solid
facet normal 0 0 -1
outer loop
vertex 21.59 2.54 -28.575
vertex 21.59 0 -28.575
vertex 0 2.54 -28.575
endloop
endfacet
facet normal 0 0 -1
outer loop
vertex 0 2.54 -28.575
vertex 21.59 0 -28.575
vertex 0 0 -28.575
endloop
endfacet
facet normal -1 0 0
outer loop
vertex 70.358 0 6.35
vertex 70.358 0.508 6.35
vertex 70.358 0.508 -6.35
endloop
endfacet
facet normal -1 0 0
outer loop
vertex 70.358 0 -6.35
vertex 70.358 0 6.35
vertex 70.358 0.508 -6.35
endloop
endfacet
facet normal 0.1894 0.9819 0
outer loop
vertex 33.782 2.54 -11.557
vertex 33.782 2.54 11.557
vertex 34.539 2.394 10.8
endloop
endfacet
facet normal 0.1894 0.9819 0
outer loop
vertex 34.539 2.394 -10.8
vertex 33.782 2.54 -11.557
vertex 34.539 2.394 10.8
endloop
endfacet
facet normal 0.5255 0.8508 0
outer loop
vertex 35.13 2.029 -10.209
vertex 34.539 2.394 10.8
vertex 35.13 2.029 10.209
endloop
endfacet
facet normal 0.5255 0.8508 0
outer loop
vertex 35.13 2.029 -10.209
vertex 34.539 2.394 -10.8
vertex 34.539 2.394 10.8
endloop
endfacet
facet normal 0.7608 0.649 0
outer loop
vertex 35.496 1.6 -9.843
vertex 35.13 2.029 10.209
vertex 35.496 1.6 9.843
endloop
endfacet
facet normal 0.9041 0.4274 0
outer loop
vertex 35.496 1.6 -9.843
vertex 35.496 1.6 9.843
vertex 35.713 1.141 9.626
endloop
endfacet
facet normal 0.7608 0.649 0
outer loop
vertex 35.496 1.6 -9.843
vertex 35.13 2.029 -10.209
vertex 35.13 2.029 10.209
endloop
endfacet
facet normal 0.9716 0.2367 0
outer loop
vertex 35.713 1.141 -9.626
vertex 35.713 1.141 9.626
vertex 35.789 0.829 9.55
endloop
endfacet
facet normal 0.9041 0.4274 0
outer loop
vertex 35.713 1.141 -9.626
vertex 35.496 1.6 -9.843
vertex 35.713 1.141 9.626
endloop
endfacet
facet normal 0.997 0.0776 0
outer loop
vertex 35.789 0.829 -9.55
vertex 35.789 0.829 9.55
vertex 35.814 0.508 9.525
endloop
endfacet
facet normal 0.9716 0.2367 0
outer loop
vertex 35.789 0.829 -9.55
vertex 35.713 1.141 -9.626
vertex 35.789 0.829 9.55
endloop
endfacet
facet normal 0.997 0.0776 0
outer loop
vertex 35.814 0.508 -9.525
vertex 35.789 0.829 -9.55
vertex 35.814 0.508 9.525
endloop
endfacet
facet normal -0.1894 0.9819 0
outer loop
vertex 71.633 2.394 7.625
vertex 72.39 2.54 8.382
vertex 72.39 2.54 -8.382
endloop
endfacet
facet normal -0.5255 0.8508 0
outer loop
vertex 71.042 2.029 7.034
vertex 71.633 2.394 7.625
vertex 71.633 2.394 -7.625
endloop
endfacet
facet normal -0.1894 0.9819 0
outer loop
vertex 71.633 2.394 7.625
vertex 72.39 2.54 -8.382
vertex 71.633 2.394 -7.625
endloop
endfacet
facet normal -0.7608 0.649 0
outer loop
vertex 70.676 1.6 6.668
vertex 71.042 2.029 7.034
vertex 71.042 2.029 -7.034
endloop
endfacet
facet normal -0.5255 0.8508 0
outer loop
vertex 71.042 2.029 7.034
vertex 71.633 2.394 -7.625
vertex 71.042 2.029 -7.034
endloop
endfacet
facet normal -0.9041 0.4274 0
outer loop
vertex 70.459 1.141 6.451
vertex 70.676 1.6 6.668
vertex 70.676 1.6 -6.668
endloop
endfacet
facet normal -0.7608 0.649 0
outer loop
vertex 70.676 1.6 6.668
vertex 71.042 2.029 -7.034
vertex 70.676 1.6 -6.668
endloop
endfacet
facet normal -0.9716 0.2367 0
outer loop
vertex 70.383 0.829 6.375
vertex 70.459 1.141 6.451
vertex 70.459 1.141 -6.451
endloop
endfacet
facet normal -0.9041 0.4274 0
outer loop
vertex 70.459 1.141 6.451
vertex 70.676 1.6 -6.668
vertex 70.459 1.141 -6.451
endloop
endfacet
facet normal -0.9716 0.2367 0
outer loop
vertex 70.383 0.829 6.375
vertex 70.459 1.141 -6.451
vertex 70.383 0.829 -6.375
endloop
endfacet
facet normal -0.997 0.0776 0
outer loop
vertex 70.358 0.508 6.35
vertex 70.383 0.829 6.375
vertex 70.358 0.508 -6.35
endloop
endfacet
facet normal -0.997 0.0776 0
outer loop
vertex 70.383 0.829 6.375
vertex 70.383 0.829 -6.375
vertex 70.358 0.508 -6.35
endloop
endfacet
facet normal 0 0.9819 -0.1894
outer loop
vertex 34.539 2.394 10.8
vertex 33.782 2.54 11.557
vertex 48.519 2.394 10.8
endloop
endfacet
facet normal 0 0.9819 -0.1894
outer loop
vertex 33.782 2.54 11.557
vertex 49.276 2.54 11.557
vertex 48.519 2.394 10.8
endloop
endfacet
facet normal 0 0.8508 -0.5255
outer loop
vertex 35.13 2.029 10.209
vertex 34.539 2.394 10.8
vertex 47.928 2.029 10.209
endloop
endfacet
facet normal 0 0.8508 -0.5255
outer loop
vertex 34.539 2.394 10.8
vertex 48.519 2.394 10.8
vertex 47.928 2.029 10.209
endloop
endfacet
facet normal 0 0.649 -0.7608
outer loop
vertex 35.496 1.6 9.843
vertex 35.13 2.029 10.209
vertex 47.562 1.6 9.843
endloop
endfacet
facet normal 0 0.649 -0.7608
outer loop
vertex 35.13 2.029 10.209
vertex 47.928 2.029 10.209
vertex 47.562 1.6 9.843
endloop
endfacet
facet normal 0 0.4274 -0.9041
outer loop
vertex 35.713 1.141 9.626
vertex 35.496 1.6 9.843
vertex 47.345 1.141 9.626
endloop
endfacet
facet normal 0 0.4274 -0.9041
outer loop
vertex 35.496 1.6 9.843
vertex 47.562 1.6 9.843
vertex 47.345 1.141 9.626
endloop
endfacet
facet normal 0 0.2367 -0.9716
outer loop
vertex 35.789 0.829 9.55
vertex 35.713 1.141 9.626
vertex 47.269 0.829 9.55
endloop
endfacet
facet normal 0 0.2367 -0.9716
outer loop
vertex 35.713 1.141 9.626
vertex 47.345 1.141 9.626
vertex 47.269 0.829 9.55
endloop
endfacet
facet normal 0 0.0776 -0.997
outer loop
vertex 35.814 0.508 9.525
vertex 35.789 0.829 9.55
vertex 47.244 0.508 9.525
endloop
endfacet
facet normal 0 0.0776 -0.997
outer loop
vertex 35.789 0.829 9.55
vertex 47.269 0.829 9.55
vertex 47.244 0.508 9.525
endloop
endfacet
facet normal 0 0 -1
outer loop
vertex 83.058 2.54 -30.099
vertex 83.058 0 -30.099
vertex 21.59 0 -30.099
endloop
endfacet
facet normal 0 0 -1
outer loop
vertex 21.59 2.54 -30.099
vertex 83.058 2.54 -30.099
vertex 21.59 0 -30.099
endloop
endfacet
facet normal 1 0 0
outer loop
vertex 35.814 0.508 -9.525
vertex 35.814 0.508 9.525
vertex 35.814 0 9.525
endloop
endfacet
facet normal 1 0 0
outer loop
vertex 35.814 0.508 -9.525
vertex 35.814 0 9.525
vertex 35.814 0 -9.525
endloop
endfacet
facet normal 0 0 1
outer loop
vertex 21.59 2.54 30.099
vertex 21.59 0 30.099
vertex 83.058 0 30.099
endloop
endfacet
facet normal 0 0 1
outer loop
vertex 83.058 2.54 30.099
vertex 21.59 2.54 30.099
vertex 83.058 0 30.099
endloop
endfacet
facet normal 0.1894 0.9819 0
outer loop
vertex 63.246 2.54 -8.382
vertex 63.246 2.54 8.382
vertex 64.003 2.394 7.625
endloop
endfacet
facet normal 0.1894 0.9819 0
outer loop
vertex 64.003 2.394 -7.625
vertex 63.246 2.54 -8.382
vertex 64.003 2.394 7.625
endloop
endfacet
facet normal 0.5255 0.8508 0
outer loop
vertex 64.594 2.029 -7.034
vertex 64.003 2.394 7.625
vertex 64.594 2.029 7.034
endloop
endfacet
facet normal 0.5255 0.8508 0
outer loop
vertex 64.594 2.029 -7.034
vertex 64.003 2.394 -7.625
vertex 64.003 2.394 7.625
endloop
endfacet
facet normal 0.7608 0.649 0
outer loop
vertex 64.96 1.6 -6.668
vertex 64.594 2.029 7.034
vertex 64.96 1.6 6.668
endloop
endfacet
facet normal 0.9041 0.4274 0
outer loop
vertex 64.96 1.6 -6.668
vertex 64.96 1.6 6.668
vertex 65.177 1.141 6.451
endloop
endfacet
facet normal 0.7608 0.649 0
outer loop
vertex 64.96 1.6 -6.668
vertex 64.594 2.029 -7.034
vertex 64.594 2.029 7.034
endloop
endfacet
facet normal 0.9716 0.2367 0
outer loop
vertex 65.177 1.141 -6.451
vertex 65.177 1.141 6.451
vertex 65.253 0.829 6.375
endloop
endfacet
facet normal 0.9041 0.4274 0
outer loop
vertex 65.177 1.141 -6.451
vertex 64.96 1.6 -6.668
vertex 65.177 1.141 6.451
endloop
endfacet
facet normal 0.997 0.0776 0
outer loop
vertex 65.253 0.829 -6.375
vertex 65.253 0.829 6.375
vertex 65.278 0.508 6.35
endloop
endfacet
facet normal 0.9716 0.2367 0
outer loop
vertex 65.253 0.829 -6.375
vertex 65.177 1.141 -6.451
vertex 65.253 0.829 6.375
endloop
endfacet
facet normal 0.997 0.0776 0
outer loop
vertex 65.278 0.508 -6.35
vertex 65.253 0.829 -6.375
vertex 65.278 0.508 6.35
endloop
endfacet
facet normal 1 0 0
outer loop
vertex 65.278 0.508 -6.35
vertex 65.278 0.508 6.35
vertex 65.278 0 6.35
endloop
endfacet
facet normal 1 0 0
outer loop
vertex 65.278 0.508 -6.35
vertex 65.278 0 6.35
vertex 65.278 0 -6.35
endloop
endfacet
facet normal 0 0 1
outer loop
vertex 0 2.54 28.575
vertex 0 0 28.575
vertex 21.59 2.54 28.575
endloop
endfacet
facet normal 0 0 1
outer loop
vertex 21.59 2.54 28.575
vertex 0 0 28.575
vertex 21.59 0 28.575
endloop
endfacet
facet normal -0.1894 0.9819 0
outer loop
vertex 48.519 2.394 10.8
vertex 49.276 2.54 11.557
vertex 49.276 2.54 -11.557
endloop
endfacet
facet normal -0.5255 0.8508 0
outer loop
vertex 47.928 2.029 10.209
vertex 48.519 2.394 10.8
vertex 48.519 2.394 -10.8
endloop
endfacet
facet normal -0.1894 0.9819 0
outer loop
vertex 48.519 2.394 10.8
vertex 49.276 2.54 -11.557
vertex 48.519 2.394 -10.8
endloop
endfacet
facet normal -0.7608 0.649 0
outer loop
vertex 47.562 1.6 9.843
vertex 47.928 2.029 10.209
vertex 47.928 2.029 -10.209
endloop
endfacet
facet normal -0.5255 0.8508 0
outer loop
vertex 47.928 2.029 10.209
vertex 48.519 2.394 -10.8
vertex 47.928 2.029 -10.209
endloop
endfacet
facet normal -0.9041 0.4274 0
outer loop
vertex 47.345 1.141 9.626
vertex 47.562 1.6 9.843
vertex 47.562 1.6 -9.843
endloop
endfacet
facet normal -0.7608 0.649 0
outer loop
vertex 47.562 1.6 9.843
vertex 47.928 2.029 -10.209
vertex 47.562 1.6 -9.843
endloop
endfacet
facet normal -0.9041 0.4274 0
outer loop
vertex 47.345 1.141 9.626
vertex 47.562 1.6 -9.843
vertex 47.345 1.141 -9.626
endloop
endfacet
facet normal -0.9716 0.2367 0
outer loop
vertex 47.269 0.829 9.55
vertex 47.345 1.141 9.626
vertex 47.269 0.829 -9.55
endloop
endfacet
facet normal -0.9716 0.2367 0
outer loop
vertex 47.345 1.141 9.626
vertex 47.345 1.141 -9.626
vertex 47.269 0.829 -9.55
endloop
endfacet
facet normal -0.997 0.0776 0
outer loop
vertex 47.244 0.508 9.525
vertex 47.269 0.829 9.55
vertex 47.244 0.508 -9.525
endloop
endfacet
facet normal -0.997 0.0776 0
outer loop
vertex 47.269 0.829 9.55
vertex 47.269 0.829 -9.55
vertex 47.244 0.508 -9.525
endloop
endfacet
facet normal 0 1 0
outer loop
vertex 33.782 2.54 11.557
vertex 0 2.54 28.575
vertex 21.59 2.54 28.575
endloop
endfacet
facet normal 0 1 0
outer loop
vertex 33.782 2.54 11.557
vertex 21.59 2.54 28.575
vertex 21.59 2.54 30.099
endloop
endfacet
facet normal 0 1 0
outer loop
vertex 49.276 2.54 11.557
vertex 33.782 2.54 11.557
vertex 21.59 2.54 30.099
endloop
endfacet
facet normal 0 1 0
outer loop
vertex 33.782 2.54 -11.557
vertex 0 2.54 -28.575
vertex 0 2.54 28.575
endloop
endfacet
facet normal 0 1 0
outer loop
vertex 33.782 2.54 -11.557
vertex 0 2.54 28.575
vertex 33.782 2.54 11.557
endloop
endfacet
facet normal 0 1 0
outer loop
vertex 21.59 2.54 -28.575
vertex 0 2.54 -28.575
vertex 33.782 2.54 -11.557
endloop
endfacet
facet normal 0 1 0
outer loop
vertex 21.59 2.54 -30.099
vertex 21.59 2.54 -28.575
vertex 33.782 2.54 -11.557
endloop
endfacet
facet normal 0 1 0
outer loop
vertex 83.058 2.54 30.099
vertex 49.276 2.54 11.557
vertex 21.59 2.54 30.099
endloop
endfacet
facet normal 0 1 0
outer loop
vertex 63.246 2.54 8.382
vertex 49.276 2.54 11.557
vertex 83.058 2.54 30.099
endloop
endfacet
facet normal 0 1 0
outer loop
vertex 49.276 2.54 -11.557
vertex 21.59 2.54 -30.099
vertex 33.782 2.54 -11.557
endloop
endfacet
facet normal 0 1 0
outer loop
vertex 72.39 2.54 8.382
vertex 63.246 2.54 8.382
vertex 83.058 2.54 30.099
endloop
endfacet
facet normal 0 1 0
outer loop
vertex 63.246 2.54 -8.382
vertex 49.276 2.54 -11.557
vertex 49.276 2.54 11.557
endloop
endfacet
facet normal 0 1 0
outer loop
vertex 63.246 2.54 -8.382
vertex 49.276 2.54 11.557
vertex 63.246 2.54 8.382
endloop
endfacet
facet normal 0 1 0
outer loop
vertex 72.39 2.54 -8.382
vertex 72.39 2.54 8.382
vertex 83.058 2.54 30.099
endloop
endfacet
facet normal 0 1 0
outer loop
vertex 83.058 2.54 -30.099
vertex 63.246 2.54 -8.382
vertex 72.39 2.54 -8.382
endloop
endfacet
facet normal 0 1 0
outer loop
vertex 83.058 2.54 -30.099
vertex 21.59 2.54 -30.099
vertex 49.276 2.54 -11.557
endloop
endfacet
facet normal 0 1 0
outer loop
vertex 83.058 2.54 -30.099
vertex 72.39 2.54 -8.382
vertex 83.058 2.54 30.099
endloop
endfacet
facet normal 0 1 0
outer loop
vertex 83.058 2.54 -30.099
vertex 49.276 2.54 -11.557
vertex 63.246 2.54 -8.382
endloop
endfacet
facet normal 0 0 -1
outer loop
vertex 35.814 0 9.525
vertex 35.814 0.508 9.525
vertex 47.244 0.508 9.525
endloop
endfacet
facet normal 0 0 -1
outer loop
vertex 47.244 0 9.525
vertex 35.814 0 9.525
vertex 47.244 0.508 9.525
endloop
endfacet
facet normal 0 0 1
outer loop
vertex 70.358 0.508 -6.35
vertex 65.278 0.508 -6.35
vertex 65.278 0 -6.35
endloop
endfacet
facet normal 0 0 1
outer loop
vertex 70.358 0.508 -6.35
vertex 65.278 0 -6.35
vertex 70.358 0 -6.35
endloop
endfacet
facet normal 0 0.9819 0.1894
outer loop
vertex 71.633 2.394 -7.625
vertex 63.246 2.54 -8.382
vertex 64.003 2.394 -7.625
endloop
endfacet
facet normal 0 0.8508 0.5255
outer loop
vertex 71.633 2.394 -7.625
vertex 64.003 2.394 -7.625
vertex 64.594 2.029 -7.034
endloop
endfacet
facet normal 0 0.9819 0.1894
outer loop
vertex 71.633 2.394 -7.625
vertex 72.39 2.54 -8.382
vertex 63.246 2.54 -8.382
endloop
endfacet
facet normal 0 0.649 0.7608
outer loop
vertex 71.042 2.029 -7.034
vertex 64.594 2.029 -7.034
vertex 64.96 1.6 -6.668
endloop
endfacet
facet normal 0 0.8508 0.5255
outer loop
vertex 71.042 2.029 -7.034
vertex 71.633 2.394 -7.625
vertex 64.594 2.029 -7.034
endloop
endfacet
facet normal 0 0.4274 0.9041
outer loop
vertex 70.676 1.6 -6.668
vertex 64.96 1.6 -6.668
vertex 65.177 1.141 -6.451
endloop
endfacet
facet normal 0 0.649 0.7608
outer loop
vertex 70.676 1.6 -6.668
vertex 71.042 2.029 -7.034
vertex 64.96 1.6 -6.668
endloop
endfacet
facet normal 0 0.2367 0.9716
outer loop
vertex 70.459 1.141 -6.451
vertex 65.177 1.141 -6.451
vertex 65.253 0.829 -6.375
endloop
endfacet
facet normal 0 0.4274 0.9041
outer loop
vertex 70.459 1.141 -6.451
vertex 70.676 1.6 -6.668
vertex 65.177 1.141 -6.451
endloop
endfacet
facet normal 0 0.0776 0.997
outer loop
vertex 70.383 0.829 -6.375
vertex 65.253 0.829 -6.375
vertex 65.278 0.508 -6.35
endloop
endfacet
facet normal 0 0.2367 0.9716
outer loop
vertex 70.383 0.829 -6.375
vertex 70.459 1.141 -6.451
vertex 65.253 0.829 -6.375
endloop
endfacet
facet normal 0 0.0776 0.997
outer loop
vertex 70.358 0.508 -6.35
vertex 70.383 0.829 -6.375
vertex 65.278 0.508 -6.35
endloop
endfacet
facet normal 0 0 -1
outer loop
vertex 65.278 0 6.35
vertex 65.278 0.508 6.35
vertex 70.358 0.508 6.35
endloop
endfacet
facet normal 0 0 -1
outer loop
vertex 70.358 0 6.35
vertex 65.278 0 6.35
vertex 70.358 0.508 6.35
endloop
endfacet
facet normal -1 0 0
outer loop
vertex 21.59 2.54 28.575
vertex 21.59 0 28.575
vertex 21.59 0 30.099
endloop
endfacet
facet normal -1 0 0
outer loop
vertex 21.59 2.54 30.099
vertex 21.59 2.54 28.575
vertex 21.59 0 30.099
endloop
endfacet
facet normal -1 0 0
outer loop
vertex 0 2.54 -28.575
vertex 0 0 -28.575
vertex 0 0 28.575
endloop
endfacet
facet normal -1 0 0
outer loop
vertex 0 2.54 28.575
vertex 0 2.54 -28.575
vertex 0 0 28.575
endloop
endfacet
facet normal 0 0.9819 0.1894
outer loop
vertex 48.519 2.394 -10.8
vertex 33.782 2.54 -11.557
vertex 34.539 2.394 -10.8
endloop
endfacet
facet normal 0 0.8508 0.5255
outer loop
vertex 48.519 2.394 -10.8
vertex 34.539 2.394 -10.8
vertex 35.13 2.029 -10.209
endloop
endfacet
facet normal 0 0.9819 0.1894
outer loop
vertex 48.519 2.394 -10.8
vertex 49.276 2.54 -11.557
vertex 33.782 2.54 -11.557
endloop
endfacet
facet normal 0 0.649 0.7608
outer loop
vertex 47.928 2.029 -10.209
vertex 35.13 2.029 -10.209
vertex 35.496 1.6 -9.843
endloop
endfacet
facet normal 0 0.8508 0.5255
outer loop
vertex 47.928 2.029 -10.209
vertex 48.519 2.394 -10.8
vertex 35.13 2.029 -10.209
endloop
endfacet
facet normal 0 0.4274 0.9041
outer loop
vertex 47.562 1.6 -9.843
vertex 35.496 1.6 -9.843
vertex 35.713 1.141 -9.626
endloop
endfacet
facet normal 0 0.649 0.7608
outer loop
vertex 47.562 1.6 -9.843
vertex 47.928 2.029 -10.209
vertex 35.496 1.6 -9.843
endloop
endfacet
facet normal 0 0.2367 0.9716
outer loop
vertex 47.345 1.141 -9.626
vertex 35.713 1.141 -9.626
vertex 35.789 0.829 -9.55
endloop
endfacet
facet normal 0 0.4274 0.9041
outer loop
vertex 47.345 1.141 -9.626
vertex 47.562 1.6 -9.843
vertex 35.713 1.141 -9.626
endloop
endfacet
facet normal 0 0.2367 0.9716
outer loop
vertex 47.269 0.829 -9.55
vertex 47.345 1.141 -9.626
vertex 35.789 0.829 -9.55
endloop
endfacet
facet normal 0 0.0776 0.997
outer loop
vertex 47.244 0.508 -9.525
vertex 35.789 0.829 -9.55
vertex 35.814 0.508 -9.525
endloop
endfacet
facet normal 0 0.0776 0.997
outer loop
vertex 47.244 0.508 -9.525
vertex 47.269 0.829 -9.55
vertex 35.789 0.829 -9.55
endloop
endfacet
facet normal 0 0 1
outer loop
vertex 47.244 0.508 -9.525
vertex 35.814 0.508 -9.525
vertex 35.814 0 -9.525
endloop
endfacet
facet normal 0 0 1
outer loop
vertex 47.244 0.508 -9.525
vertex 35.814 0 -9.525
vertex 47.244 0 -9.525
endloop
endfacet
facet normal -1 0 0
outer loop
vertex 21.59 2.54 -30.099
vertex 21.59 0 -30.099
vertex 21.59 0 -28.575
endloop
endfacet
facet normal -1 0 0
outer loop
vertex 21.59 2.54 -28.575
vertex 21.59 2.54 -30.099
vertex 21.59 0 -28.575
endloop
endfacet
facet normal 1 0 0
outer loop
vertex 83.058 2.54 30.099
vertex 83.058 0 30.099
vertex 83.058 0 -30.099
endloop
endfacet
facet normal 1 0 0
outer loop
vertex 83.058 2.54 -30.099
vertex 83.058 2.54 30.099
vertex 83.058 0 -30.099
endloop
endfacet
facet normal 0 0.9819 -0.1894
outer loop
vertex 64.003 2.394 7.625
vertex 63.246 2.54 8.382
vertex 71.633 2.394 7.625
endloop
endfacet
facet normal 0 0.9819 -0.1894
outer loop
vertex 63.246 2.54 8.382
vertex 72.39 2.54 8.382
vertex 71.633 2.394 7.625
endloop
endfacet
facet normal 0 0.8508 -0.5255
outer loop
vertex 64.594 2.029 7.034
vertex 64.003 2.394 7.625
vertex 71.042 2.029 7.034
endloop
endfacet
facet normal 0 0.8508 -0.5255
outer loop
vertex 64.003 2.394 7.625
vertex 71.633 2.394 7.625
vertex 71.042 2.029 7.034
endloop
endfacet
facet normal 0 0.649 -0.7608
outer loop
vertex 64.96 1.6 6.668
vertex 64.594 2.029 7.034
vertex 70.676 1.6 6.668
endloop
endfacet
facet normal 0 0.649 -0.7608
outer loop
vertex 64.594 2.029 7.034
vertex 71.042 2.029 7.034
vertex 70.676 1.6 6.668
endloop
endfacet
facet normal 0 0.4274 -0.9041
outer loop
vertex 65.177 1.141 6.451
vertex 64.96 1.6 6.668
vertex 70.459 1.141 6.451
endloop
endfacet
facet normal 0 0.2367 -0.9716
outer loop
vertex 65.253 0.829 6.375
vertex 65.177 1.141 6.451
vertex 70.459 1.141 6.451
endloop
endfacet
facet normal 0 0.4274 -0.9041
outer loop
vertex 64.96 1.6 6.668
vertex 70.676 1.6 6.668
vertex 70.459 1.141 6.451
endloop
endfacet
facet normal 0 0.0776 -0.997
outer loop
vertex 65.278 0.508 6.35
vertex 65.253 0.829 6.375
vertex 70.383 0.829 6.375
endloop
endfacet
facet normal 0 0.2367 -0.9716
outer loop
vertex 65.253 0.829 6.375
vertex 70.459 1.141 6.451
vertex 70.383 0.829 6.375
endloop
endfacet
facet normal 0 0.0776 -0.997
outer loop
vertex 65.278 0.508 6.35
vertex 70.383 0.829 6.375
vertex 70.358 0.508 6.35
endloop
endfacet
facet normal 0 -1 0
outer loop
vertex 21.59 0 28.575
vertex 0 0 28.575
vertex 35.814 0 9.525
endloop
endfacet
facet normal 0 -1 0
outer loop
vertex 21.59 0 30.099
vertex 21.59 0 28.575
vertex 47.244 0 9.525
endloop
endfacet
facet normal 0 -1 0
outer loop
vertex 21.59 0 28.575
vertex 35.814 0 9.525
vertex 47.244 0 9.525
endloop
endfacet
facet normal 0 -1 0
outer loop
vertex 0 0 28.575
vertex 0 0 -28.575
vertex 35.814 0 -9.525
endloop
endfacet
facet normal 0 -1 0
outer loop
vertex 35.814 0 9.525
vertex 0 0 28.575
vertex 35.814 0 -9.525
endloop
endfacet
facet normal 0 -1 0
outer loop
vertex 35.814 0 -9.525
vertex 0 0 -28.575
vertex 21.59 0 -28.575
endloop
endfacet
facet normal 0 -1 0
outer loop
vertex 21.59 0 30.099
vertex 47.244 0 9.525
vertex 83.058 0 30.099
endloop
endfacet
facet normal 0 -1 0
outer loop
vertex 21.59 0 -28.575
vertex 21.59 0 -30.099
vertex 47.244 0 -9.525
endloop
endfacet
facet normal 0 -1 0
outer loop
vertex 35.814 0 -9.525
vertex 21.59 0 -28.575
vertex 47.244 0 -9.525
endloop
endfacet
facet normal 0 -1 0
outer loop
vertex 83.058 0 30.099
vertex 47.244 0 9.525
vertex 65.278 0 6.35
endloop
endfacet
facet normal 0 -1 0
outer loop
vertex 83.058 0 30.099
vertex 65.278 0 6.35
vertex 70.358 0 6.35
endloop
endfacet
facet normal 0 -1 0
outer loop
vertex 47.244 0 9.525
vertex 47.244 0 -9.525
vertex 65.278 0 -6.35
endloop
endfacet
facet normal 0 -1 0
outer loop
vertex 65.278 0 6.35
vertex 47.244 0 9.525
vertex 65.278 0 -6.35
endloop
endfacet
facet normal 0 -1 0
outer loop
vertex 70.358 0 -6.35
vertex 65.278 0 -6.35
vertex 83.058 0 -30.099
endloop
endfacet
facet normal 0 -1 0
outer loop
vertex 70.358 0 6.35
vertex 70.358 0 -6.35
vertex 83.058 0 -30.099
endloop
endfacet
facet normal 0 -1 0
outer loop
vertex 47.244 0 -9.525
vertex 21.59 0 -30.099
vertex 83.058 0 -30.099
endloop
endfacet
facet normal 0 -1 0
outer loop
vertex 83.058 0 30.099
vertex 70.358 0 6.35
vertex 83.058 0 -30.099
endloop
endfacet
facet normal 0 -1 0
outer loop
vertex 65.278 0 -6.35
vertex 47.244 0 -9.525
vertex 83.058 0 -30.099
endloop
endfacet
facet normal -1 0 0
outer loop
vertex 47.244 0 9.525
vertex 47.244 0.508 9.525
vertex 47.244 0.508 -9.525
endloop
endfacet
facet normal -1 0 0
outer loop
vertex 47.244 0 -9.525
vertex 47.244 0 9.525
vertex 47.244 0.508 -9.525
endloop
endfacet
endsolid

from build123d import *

# Parameters (mm, degrees)
BOSS_EXTRUDE1_DEPTH = 2.54
SKETCH2_W           = 11.43
SKETCH2_H           = 19.05
SKETCH2_W_2         = 5.08
SKETCH2_H_2         = 12.7
CUT_EXTRUDE1_DEPTH  = 89.380047324
FILLET1_R           = 2.032


with BuildPart() as part:
    # Sketch1 → Boss-Extrude1 (new body)
    with BuildSketch(Plane(origin=(0, 0, 0), x_dir=(1, 0, 0), z_dir=(0, 1, 0))):
        Polygon((0, 28.575), (0, -28.575), (21.59, -28.575), (21.59, -30.099), (83.058, -30.099), (83.058, 30.099), (21.59, 30.099), (21.59, 28.575), align=None)
    extrude(amount=BOSS_EXTRUDE1_DEPTH)

    # Sketch2 → Cut-Extrude1 (cut, through all)
    with BuildSketch(Plane(origin=(0, 2.54, 0), x_dir=(1, 0, 0), z_dir=(0, 1, 0))):
        with Locations((41.529, 0)):
            Rectangle(SKETCH2_W, SKETCH2_H)
        with Locations((67.818, 0)):
            Rectangle(SKETCH2_W_2, SKETCH2_H_2)
    extrude(amount=-CUT_EXTRUDE1_DEPTH, mode=Mode.SUBTRACT)

    # Fillet1
    fillet1_edges = [part.edges().sort_by_distance(p)[0] for p in [
        (47.244, 2.54, 0),
        (41.529, 2.54, -9.525),
        (35.814, 2.54, 0),
        (41.529, 2.54, 9.525),
        (70.358, 2.54, 0),
        (67.818, 2.54, -6.35),
        (65.278, 2.54, 0),
        (67.818, 2.54, 6.35),
    ]]
    fillet(fillet1_edges, radius=FILLET1_R)


solid = part.part
